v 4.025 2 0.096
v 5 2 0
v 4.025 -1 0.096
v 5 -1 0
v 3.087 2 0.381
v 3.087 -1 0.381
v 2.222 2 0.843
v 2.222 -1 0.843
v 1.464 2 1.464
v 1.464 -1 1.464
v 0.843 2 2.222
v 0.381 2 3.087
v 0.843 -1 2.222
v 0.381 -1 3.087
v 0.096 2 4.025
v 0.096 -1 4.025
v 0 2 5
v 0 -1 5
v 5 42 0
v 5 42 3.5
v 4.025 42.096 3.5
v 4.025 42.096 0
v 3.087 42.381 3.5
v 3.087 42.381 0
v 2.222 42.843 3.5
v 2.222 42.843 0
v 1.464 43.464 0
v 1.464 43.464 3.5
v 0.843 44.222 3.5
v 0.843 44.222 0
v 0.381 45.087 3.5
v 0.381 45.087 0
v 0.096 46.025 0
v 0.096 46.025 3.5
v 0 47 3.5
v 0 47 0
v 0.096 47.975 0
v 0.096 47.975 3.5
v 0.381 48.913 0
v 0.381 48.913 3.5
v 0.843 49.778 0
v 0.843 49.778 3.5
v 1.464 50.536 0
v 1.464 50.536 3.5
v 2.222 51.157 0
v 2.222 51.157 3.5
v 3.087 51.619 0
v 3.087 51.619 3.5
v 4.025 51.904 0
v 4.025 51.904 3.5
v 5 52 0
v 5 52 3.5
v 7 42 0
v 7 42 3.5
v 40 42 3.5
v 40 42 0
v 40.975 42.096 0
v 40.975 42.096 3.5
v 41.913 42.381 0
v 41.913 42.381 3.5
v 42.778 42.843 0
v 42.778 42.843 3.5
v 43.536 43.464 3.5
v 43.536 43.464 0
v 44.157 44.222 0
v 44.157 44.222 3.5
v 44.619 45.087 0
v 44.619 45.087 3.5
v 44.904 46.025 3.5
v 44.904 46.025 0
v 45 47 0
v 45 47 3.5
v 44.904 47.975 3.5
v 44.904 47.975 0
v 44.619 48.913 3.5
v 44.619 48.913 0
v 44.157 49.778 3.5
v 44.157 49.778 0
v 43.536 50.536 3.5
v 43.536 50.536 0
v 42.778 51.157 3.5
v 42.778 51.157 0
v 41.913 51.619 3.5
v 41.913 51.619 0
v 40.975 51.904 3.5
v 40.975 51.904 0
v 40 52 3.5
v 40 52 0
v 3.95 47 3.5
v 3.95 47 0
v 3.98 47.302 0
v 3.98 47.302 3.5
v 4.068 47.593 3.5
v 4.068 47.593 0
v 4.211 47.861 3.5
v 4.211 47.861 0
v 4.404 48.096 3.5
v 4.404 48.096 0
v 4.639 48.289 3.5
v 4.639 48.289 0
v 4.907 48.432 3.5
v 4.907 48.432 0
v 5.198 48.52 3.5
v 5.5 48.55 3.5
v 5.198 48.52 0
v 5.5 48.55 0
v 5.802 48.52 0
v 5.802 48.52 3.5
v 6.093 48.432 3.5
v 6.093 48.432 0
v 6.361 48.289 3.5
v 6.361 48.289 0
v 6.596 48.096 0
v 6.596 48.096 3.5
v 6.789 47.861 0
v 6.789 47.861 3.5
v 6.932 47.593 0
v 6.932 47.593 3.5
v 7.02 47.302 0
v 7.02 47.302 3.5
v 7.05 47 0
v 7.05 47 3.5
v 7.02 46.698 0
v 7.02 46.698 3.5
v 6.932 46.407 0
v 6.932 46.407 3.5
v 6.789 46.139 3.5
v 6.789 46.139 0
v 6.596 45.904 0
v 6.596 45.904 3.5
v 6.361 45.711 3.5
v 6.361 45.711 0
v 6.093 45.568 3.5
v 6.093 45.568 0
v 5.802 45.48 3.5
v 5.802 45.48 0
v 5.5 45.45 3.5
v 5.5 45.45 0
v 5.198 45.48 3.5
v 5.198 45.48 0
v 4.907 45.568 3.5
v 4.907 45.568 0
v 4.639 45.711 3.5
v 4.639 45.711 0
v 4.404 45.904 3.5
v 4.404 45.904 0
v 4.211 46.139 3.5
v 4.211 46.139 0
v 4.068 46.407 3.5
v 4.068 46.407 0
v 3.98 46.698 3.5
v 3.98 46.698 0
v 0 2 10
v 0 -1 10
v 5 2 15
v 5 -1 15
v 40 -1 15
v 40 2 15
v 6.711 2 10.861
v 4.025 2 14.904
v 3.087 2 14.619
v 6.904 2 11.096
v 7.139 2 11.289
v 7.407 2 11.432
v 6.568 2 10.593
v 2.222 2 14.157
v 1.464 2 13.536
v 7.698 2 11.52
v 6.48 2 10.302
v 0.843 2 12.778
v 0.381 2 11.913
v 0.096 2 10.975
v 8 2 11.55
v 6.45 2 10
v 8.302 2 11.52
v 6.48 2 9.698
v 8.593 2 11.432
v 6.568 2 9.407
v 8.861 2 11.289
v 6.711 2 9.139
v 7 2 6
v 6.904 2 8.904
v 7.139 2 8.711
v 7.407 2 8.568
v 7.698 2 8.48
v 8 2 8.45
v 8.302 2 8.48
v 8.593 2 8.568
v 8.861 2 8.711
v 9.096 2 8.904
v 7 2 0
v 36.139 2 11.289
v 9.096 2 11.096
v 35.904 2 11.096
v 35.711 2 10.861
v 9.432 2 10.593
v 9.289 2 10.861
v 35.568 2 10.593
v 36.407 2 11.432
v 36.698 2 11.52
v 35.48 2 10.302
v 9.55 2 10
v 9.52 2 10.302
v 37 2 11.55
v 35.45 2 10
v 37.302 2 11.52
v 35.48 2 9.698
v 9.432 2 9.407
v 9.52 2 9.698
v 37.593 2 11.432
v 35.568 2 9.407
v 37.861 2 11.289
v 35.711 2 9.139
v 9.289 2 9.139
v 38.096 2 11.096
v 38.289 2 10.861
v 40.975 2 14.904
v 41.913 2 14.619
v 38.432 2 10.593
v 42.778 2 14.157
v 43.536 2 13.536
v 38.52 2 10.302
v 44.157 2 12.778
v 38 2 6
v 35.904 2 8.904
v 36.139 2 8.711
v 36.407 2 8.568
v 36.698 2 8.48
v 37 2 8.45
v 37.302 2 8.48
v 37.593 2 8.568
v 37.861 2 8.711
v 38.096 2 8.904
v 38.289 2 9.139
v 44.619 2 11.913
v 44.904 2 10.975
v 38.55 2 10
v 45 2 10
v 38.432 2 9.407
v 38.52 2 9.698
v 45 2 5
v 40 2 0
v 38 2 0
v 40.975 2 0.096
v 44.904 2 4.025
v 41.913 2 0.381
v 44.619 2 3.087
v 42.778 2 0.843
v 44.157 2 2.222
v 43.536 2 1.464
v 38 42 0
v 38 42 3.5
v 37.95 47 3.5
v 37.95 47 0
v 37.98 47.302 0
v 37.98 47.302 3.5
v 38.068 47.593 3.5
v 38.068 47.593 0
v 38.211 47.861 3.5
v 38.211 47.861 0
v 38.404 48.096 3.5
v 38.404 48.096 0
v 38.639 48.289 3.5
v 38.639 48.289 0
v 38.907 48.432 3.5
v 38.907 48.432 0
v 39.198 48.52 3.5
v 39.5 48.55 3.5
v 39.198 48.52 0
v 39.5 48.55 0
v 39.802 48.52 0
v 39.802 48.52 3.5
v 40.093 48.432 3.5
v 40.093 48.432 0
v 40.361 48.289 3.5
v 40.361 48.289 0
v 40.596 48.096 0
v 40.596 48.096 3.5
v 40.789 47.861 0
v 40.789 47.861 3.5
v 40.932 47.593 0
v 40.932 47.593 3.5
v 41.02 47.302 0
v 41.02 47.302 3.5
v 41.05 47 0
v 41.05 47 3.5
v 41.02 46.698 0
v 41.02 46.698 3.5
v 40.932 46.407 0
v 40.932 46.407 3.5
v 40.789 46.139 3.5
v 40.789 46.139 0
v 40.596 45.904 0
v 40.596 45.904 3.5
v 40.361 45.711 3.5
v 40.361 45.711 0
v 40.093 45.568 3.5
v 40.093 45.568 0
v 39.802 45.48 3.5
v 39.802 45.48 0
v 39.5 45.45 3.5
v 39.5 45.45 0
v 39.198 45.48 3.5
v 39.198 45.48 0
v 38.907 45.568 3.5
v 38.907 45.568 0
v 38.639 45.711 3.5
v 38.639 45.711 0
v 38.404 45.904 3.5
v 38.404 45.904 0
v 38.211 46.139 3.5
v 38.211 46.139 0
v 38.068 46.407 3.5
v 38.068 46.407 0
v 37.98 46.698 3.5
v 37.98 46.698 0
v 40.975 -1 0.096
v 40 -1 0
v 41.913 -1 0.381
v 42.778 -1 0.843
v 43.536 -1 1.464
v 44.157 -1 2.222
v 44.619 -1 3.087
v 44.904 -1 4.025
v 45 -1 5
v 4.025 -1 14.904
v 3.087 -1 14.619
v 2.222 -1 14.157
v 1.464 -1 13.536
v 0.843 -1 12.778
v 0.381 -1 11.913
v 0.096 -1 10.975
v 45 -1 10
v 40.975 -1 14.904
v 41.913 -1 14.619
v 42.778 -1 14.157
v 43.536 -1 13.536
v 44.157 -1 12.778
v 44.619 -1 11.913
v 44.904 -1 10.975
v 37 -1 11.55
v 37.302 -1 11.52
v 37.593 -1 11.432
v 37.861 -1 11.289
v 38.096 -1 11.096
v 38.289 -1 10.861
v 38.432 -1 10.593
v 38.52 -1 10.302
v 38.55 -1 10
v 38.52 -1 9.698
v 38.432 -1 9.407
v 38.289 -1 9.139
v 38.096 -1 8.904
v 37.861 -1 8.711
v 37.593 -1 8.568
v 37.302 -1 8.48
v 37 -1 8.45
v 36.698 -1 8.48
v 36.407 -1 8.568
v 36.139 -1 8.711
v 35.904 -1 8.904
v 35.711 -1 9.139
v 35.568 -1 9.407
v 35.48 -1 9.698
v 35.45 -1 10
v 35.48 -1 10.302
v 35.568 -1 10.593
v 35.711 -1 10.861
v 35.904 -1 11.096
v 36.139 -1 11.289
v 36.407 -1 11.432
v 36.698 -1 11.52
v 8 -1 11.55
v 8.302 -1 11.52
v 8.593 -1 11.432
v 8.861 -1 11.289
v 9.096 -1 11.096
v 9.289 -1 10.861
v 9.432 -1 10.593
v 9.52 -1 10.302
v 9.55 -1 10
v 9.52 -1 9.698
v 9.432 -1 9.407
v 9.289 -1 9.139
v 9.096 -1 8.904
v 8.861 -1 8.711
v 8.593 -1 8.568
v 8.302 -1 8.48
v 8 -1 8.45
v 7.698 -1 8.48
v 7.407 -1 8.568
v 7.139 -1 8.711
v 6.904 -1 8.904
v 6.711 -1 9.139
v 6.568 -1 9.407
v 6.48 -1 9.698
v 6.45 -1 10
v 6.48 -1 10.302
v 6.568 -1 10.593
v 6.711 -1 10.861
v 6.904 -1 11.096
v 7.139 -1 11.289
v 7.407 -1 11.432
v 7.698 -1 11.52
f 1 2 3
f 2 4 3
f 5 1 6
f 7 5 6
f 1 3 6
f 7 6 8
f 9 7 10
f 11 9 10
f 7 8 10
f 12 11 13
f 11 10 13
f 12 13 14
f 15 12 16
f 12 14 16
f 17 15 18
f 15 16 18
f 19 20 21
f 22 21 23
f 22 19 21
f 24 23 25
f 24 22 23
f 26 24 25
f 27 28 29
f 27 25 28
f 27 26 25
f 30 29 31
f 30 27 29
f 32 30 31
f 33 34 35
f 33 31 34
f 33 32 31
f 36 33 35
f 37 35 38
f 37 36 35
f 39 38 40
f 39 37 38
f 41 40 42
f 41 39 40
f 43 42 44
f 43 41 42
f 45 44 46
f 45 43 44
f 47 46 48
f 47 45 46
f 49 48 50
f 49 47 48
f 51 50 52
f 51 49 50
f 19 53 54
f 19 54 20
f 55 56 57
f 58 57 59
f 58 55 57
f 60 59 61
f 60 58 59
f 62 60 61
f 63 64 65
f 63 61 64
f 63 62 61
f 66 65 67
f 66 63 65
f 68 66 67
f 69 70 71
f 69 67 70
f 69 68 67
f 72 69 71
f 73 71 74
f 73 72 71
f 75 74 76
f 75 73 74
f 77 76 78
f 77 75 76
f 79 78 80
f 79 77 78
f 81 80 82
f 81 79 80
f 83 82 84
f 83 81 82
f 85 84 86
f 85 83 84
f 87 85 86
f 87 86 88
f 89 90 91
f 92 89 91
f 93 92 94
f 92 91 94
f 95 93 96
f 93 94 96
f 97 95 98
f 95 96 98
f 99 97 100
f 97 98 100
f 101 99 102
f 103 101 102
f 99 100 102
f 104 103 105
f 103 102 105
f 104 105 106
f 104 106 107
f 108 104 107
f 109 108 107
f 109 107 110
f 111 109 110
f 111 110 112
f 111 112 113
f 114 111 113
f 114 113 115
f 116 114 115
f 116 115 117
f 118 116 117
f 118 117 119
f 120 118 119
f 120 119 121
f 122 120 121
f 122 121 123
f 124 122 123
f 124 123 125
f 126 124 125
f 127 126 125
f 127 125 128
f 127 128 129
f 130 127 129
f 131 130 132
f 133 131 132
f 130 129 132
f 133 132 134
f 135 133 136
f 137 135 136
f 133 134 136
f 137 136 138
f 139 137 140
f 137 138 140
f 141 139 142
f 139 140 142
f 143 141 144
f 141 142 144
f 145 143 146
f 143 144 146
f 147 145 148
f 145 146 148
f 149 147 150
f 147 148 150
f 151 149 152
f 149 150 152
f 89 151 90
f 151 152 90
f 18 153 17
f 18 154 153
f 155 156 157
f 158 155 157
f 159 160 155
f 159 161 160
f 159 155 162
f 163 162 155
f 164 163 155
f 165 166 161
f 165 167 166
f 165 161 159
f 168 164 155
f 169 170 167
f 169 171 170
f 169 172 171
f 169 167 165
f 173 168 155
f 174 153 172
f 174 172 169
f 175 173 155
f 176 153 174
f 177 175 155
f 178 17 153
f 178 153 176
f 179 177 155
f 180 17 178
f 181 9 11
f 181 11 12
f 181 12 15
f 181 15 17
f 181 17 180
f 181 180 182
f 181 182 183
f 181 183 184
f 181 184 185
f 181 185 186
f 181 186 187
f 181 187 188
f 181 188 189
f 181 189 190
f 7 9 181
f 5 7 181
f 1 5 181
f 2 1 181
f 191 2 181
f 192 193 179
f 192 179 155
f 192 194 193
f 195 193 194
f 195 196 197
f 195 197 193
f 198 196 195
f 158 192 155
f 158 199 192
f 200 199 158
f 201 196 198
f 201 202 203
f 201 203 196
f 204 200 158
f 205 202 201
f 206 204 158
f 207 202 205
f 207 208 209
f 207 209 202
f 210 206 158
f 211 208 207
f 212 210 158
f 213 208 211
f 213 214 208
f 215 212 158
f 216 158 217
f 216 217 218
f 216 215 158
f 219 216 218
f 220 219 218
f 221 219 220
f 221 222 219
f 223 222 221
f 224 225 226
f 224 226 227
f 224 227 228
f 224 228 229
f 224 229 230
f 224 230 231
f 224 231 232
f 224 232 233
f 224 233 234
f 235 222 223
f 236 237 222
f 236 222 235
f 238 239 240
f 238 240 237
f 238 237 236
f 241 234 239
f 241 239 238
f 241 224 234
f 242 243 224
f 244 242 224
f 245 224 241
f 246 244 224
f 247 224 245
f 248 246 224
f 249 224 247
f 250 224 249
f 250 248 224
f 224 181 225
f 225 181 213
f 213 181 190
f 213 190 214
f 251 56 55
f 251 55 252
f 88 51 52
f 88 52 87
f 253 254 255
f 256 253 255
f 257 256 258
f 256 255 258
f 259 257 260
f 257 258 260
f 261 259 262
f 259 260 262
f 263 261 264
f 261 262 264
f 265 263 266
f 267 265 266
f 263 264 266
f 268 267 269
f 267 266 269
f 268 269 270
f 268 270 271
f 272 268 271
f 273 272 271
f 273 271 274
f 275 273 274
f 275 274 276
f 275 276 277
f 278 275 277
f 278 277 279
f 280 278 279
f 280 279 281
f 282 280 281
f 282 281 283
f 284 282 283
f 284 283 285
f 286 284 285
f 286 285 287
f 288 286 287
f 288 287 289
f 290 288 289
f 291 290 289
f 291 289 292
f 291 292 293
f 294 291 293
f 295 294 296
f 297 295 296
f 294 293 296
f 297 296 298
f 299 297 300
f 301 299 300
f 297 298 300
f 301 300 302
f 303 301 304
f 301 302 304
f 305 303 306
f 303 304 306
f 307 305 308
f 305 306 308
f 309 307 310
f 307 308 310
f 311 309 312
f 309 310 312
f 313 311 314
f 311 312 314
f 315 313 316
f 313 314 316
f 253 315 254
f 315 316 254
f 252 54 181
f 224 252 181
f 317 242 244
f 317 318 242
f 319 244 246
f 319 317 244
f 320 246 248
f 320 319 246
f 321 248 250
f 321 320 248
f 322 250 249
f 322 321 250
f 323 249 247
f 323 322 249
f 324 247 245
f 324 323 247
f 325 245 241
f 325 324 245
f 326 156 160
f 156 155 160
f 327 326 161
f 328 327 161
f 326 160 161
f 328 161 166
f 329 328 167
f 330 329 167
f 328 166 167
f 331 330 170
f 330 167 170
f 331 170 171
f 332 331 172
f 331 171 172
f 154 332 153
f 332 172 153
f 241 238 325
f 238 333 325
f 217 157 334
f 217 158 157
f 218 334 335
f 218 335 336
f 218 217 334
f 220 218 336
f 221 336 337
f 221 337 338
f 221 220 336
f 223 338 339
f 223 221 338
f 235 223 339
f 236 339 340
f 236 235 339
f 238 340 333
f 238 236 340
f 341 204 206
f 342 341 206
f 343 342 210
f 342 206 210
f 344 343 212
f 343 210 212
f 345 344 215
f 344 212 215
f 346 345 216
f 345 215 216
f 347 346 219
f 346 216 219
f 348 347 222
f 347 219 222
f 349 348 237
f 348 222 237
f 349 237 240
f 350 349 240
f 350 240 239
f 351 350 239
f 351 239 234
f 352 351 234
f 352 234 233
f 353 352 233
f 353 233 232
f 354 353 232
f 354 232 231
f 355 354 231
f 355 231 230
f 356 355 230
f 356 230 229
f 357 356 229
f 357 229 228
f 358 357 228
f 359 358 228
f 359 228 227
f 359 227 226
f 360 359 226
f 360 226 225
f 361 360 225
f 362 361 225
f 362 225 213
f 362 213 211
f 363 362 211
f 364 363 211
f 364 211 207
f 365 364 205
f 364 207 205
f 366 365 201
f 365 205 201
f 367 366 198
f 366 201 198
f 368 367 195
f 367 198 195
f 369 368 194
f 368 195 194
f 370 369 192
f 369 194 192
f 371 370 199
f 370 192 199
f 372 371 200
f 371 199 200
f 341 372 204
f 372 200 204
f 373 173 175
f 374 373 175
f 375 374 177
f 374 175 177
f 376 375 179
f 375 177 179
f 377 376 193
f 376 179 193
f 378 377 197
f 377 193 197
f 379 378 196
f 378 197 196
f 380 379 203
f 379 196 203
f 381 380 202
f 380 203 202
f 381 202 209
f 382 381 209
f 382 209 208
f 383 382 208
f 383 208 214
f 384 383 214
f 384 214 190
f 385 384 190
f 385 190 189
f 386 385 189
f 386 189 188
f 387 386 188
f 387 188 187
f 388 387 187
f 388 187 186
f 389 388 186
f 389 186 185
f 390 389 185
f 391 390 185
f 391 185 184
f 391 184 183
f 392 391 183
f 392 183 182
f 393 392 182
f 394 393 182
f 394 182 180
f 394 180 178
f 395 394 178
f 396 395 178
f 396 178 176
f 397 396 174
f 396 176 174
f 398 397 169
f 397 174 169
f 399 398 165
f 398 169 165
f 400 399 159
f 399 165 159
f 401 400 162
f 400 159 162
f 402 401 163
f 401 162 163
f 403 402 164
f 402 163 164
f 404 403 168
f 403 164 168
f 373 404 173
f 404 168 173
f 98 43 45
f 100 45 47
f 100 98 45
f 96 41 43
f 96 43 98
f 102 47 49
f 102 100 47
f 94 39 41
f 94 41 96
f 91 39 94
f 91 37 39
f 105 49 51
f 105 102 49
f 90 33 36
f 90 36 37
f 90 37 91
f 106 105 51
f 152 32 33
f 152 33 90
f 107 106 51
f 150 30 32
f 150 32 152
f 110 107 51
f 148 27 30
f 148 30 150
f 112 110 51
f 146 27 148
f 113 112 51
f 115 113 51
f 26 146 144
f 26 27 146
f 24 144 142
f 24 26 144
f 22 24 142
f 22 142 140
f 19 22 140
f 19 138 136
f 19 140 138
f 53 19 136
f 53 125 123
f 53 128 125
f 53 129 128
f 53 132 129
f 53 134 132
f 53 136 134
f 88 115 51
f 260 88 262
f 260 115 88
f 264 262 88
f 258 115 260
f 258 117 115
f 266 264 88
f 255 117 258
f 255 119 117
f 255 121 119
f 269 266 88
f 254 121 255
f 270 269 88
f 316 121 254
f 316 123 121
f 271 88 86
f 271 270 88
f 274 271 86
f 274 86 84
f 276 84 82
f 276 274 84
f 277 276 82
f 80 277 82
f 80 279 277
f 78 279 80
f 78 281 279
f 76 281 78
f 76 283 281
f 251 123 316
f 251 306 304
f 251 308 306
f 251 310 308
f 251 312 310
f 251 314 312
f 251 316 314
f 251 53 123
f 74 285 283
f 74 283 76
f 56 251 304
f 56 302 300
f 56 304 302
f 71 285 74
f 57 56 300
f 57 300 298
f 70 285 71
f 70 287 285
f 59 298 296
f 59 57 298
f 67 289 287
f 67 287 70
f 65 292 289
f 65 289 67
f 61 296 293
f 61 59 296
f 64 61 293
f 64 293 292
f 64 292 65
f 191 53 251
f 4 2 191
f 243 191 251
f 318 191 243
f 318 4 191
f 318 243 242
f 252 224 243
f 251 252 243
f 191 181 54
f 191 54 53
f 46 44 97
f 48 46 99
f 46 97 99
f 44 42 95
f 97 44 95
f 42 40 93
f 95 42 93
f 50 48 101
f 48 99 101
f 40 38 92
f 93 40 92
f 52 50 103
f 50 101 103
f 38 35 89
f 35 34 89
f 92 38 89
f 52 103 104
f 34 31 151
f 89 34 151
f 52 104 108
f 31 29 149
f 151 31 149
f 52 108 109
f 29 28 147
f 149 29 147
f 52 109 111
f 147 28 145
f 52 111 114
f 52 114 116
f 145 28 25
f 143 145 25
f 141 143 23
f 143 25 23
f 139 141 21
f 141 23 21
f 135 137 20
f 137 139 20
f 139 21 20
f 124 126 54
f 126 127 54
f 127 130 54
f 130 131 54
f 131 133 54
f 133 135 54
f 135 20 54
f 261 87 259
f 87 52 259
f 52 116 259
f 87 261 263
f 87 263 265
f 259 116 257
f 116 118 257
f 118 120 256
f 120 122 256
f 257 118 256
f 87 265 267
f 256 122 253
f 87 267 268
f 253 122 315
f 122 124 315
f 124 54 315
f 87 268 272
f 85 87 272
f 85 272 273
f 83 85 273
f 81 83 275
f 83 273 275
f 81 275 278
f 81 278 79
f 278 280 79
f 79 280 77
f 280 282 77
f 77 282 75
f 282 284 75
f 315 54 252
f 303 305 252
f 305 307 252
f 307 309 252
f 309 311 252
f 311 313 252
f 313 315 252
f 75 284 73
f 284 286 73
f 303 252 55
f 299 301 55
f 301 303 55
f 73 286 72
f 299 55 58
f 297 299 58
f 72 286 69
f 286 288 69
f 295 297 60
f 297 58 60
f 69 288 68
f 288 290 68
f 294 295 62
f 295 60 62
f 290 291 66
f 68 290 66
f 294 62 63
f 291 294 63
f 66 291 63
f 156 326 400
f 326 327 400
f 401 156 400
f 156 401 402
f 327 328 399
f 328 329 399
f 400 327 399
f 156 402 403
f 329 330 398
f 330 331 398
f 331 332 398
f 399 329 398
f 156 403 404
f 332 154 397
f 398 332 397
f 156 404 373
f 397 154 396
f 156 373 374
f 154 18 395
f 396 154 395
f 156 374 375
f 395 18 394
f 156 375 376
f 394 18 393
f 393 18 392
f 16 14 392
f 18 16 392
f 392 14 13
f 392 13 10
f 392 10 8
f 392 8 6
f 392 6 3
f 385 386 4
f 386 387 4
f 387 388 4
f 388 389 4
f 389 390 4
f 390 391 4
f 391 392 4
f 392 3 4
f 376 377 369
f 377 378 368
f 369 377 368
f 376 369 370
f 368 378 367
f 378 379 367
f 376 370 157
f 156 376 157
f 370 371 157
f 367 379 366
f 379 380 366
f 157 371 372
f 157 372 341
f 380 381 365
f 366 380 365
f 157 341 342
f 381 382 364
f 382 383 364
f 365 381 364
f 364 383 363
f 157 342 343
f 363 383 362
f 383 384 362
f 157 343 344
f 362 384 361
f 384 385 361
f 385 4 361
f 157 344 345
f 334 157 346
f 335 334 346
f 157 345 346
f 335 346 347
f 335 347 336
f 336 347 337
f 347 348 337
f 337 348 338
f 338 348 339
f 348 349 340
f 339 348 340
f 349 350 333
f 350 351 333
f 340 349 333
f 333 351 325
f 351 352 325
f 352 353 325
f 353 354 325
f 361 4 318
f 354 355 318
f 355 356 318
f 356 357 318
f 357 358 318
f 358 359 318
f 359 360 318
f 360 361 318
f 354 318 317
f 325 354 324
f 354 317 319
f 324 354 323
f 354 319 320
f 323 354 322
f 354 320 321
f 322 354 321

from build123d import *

# Parameters (mm, degrees)
EXTRUDE_1_DEPTH          = 2
EXTRUDE_1_DEPTH_BACK     = 1
SKETCH_1_W               = 45
SKETCH_1_H               = 15
SKETCH_2_W               = 45
SKETCH_2_H               = 3.5
EXTRUDE_2_DEPTH          = 50
SKETCH_3_R               = 1.55
CUT_EXTRUDE_1_DEPTH      = 69.92024376
SKETCH_4_R               = 1.55
CUT_EXTRUDE_2_DEPTH      = 71.384657419
SKETCH_5_W               = 31
SKETCH_5_H               = 5
EXTRUDE_4_DEPTH          = 10
SKETCH_8_W               = 7
SKETCH_8_H               = 40
CUT_EXTRUDE_5_DEPTH      = 10
FILLET_4_RADIUS          = 5
FILLET_4_LENGTH          = 3.5
FILLET_5_RADIUS          = 5
FILLET_5_LENGTH          = 3.5
CUT_EXTRUDE_7_DEPTH      = 67.128662469
CUT_EXTRUDE_7_DEPTH_BACK = 67.128662469
EXTRUDE_5_DEPTH          = 31
FILLET_6_R               = 5


with BuildPart() as part:
    # 草图1 → 凸台-拉伸1 (new, two sides: drawn at the far end of the back side and taken through both)
    with BuildSketch(Plane(origin=(0, 0, 0), x_dir=(1, 0, 0), z_dir=(0, 1, 0)).offset(-EXTRUDE_1_DEPTH_BACK)):
        with Locations((22.5, -7.5)):
            Rectangle(SKETCH_1_W, SKETCH_1_H)
    extrude(amount=EXTRUDE_1_DEPTH + EXTRUDE_1_DEPTH_BACK)

    # 草图2 → 凸台-拉伸2 (add)
    with BuildSketch(Plane(origin=(0, 2, 0), x_dir=(1, 0, 0), z_dir=(0, 1, 0))):
        with Locations((22.5, -1.75)):
            Rectangle(SKETCH_2_W, SKETCH_2_H)
    extrude(amount=EXTRUDE_2_DEPTH)

    # 草图3 → 切除-拉伸1 (cut, through all)
    with BuildSketch(Plane(origin=(0, 2, 0), x_dir=(1, 0, 0), z_dir=(0, 1, 0))):
        with Locations(Location((8, -10, 0), (0, 0, 270))):
            Circle(SKETCH_3_R)
        with Locations(Location((37, -10, 0), (0, 0, 270))):
            Circle(SKETCH_3_R)
    extrude(amount=-CUT_EXTRUDE_1_DEPTH, mode=Mode.SUBTRACT)

    # 草图4 → 切除-拉伸2 (cut, through all)
    with BuildSketch(Plane(origin=(0, 0, 0), x_dir=(-1, 0, 0), z_dir=(0, 0, -1))):
        with Locations((-39.5, 47)):
            Circle(SKETCH_4_R)
        with Locations((-5.5, 47)):
            Circle(SKETCH_4_R)
    extrude(amount=-CUT_EXTRUDE_2_DEPTH, mode=Mode.SUBTRACT)

    # 草图5 → 凸台-拉伸4 (add)
    with BuildSketch(Plane(origin=(0, 0, 0), x_dir=(-1, 0, 0), z_dir=(0, 0, -1))):
        with Locations((-22.5, 39.5)):
            Rectangle(SKETCH_5_W, SKETCH_5_H)
    extrude(amount=EXTRUDE_4_DEPTH)

    # 草图8 → 切除-拉伸5 (cut)
    with BuildSketch(Plane(origin=(0, 0, 0), x_dir=(-1, 0, 0), z_dir=(0, 0, -1))):
        with Locations((-41.5, 22)):
            Rectangle(SKETCH_8_W, SKETCH_8_H)
        with Locations((-3.5, 22)):
            Rectangle(SKETCH_8_W, SKETCH_8_H)
    extrude(amount=-CUT_EXTRUDE_5_DEPTH, mode=Mode.SUBTRACT)

    # 圆角4: full round fillet: the end face becomes a half cylinder, R = half its width
    fillet_4_face = Plane((45, 47, 1.75), x_dir=(0, 0, 1), z_dir=(1, 0, 0))  # on the end face: x along it, z out of the body
    fillet_4_slab = fillet_4_face.offset(-FILLET_4_RADIUS / 2) * Box(FILLET_4_LENGTH, 2 * FILLET_4_RADIUS, FILLET_4_RADIUS, mode=Mode.PRIVATE)  # the body's end, R deep
    fillet_4_round = Plane((40, 47, 1.75), x_dir=(1, 0, 0), z_dir=(0, 0, 1)) * Cylinder(FILLET_4_RADIUS, FILLET_4_LENGTH, mode=Mode.PRIVATE)  # its axis R under the face
    add(fillet_4_slab - fillet_4_round, mode=Mode.SUBTRACT)

    # 圆角5: full round fillet: the end face becomes a half cylinder, R = half its width
    fillet_5_face = Plane((0, 47, 1.75), x_dir=(0, 0, -1), z_dir=(-1, 0, 0))  # on the end face: x along it, z out of the body
    fillet_5_slab = fillet_5_face.offset(-FILLET_5_RADIUS / 2) * Box(FILLET_5_LENGTH, 2 * FILLET_5_RADIUS, FILLET_5_RADIUS, mode=Mode.PRIVATE)  # the body's end, R deep
    fillet_5_round = Plane((5, 47, 1.75), x_dir=(-1, 0, 0), z_dir=(0, 0, -1)) * Cylinder(FILLET_5_RADIUS, FILLET_5_LENGTH, mode=Mode.PRIVATE)  # its axis R under the face
    add(fillet_5_slab - fillet_5_round, mode=Mode.SUBTRACT)

    # 草图18 → 切除-拉伸7 (cut, two sides: drawn at the far end of the back side and taken through both)
    with BuildSketch(Plane.ZY.offset(-7).offset(-CUT_EXTRUDE_7_DEPTH_BACK)):
        Polygon((0, 37), (0, 42.006951797), (-10, 42), (-10, 37), align=None)
    extrude(amount=CUT_EXTRUDE_7_DEPTH + CUT_EXTRUDE_7_DEPTH_BACK, mode=Mode.SUBTRACT)

    # 草图20 → 凸台-拉伸5 (add)
    with BuildSketch(Plane.ZY.offset(-7)):
        Polygon((3.5, 42), (6, 2), (3.5, 2), align=None)
    extrude(amount=-EXTRUDE_5_DEPTH)

    # 圆角6
    fillet_6_edges = [part.edges().sort_by_distance(p)[0] for p in [
        (0, 0.5, 0),
        (45, 0.5, 0),
        (45, 0.5, 15),
        (0, 0.5, 15),
    ]]
    fillet(fillet_6_edges, radius=FILLET_6_R)


solid = part.part
